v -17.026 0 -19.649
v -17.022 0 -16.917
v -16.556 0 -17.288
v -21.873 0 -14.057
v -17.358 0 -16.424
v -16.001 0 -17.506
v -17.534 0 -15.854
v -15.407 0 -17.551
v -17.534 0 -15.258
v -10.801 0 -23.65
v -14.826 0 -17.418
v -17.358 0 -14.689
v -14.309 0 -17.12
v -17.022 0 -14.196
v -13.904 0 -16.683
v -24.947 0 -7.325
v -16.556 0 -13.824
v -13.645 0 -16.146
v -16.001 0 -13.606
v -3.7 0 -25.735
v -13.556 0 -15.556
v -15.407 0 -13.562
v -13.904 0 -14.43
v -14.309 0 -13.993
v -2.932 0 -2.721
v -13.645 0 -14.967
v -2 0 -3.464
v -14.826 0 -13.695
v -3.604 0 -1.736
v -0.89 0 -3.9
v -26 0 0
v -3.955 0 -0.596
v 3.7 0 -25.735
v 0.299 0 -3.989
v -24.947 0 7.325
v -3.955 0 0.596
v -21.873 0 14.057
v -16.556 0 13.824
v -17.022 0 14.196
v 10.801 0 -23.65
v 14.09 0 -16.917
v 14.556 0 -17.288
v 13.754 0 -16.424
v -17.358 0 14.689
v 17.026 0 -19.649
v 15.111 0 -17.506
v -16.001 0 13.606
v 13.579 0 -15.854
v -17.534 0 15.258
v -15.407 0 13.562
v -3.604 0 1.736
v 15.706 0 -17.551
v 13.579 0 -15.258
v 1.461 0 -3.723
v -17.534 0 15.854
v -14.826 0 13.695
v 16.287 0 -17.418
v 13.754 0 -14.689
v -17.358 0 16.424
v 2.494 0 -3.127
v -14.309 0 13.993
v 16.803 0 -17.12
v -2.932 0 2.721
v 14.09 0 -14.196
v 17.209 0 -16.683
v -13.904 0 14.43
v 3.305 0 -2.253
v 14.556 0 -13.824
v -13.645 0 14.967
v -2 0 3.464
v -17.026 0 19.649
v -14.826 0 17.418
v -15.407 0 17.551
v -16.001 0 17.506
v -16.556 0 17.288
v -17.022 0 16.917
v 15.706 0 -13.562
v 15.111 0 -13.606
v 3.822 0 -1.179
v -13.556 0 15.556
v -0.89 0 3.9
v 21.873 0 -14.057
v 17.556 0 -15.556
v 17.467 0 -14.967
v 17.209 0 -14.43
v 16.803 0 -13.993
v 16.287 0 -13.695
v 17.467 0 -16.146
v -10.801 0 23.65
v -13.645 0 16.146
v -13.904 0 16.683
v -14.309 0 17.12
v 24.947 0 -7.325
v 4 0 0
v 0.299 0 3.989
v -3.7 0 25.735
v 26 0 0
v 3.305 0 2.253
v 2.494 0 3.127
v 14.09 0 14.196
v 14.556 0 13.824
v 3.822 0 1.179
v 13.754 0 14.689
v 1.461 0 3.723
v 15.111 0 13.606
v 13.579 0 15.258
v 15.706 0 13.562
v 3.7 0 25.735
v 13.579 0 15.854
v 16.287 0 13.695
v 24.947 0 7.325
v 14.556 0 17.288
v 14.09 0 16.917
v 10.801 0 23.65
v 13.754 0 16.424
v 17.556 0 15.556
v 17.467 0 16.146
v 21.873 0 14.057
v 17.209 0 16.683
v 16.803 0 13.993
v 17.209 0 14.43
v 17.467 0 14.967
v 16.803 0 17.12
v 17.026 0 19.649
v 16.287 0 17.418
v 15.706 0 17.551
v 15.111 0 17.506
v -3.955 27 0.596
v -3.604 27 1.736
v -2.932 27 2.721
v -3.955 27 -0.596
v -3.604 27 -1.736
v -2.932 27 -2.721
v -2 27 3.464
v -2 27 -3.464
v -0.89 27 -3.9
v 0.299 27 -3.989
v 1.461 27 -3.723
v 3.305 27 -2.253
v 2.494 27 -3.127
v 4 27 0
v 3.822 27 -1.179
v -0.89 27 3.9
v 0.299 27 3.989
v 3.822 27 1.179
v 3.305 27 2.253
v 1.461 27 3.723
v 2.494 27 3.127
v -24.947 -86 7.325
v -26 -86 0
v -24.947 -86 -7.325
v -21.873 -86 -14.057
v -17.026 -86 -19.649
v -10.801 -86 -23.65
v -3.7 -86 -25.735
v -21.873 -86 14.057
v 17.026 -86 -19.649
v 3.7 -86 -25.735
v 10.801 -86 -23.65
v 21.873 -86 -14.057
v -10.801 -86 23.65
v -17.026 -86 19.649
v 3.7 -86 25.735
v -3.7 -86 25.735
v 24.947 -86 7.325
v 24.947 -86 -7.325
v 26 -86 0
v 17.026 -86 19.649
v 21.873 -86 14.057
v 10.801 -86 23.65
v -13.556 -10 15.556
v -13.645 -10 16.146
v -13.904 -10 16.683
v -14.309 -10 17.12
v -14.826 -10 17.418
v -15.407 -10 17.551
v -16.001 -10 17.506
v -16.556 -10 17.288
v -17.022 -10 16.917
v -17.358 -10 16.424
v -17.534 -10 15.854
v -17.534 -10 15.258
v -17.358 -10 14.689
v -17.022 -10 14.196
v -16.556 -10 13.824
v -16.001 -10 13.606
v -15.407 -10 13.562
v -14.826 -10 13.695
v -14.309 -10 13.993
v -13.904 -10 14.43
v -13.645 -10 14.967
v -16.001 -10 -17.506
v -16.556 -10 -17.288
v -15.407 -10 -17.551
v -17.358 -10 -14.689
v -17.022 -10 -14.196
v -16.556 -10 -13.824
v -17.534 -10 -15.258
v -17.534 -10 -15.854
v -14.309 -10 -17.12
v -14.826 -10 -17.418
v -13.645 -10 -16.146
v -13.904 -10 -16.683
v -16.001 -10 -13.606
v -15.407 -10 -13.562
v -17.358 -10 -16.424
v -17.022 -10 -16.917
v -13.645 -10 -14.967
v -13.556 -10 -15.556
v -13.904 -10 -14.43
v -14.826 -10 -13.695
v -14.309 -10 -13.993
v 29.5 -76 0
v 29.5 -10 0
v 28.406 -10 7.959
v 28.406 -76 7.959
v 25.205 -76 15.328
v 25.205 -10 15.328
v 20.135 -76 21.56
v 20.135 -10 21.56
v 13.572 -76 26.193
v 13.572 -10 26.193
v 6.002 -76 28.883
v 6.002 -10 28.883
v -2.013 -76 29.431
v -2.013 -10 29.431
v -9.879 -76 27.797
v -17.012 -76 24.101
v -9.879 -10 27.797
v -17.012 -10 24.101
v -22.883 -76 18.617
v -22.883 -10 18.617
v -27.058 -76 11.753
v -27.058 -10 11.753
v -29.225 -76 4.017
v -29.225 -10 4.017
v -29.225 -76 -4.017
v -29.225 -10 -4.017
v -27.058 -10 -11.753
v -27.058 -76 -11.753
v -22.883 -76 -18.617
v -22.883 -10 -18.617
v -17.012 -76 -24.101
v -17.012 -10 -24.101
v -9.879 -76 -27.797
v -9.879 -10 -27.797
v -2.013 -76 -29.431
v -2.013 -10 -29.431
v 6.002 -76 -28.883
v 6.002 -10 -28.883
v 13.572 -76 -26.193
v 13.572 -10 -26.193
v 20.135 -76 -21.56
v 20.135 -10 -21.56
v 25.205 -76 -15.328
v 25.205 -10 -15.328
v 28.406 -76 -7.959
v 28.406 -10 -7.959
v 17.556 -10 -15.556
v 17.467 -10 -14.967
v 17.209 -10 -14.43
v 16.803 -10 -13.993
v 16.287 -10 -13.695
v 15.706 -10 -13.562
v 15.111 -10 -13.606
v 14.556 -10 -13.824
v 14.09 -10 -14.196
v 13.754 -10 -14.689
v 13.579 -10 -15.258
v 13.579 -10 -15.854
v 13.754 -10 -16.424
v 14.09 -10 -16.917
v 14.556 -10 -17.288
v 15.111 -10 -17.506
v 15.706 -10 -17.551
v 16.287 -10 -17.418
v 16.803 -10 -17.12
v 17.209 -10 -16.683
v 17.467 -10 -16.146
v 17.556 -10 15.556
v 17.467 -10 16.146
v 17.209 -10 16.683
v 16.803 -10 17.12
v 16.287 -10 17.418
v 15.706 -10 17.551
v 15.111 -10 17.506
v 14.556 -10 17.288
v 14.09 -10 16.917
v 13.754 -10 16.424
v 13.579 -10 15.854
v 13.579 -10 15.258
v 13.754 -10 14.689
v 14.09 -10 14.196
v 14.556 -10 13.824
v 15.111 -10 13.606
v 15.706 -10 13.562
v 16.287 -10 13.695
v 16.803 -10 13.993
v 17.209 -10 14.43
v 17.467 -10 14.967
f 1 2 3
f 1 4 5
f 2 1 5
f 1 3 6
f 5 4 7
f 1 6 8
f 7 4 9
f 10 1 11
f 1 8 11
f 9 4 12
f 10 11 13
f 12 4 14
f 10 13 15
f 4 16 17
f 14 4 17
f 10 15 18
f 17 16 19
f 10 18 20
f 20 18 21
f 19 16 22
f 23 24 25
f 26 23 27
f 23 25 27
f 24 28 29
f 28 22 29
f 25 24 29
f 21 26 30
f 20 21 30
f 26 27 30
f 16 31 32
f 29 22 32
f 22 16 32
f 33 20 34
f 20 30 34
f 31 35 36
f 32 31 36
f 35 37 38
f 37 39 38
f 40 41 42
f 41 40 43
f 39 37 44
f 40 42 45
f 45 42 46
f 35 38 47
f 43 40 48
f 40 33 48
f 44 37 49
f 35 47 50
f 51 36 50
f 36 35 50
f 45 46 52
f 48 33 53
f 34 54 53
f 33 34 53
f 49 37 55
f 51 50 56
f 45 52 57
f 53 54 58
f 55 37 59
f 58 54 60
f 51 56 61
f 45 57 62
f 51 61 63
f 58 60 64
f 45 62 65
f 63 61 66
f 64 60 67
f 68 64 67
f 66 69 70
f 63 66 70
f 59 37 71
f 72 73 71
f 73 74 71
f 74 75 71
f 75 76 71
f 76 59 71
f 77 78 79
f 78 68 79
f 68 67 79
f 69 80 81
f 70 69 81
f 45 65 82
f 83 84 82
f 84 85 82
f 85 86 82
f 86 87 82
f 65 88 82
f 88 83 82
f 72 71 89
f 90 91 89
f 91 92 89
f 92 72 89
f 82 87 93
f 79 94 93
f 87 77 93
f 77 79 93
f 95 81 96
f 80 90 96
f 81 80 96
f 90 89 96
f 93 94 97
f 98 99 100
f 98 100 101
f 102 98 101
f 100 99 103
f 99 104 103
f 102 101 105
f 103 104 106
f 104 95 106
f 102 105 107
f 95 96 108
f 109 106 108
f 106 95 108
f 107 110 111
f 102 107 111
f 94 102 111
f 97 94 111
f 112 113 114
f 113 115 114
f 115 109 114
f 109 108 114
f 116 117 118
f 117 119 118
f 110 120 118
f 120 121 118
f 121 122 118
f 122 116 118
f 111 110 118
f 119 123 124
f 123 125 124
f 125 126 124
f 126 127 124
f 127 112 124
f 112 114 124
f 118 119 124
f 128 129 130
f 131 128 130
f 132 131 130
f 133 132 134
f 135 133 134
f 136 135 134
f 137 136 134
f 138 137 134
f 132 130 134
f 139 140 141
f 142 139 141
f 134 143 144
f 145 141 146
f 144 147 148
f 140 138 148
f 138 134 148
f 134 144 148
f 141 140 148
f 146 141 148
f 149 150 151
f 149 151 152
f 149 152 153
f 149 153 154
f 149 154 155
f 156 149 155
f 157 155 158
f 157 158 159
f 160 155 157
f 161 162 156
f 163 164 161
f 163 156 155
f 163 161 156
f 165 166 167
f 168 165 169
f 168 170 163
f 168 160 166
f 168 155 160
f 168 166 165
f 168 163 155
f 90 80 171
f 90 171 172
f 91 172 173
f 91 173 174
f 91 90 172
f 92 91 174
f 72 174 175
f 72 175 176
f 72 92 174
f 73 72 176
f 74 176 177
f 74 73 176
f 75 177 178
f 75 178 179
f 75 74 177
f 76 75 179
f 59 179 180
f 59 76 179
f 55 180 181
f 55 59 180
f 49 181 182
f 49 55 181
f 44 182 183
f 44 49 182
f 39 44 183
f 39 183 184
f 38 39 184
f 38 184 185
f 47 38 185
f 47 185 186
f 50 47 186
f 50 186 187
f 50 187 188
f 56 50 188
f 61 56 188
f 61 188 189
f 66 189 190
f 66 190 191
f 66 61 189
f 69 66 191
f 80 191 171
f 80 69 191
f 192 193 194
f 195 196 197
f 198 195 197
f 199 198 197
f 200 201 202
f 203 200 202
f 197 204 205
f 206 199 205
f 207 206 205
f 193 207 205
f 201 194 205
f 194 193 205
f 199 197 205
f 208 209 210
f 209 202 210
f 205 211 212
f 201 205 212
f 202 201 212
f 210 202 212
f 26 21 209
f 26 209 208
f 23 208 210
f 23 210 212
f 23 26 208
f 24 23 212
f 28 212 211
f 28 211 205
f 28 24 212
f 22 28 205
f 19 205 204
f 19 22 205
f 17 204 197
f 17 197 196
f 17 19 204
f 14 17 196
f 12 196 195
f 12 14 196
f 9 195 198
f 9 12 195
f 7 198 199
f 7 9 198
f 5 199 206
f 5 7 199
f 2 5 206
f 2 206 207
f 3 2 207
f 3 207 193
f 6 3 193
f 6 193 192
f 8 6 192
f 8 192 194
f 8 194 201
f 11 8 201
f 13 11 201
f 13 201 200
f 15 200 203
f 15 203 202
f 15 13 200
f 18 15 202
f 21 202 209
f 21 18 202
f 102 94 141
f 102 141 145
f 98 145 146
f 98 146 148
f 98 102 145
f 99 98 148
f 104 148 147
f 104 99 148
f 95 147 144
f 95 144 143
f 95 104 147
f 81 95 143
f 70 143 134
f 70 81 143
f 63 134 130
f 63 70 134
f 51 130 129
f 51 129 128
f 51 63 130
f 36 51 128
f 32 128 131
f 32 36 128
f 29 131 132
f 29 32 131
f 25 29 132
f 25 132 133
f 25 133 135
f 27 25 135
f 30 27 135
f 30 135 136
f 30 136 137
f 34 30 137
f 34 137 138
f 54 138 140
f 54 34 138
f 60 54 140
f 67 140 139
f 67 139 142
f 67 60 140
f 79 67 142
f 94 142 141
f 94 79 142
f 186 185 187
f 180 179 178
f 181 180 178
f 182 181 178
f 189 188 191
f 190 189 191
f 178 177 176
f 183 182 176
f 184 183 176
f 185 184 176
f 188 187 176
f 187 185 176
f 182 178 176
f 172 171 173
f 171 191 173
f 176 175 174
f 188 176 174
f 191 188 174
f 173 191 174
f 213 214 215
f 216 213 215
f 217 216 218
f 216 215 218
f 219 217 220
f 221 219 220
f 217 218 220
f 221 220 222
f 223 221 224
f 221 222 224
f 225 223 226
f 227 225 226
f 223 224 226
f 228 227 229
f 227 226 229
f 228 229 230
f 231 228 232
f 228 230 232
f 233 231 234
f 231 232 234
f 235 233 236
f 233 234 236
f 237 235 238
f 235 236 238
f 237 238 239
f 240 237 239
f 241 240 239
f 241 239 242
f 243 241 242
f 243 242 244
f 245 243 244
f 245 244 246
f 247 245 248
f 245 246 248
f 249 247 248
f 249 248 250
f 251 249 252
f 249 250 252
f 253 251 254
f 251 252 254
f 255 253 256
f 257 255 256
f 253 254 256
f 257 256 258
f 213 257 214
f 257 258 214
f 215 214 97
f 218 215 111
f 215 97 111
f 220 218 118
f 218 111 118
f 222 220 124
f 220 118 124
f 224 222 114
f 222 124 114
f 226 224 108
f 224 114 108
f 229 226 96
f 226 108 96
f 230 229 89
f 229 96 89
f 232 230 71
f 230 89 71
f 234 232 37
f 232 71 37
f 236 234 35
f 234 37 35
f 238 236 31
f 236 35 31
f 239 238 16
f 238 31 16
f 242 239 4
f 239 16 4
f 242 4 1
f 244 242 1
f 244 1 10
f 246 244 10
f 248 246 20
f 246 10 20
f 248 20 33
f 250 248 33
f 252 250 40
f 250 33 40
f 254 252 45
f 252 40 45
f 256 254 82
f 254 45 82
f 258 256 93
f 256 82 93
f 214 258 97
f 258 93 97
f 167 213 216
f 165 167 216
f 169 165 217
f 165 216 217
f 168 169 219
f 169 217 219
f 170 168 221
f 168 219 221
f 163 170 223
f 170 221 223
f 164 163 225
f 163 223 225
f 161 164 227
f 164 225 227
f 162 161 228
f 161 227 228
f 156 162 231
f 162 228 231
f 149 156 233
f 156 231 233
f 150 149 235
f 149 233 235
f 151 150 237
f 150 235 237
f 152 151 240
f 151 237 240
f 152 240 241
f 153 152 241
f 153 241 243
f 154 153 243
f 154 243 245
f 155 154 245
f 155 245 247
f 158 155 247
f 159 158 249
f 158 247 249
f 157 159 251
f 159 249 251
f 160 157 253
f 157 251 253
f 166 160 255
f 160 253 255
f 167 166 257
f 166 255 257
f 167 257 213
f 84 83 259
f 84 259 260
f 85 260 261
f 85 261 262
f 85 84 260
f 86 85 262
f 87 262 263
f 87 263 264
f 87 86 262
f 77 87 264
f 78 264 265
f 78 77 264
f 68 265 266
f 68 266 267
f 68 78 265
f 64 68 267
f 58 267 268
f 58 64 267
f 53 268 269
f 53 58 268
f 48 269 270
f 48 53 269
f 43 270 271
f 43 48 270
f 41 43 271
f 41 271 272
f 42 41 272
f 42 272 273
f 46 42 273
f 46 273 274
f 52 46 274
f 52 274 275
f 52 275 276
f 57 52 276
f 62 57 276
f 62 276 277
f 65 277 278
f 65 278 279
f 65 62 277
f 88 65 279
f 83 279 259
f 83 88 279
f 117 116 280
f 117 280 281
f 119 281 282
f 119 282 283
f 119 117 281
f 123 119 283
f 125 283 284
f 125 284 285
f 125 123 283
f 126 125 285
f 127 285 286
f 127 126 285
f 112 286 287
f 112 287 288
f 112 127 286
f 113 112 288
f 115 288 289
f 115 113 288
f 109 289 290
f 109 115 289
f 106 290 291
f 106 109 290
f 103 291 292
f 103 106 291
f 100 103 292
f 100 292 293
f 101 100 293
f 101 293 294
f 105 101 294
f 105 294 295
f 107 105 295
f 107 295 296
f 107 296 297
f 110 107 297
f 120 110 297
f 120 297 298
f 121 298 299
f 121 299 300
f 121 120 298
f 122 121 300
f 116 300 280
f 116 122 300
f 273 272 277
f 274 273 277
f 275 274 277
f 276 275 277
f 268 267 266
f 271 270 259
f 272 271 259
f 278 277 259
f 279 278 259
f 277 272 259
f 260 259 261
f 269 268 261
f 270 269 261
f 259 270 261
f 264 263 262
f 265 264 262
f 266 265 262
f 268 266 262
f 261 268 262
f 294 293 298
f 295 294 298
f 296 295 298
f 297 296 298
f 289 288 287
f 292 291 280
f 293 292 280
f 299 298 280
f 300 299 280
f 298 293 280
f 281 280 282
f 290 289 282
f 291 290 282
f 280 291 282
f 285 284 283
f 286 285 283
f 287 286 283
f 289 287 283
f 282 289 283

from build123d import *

# Parameters (mm, degrees)
F0_R     = 29.5
F0_R_2   = 2
F0_R_3   = 4
F1_DEPTH = 86
F2_DEPTH = 27
F3_DEPTH = 10
F4_SIZE2 = 3.5
F4_SIZE  = 10
F5_SIZE2 = 10
F5_SIZE  = 3.5


with BuildPart() as f1:
    # F0 (on Front) → F1 (new body)
    with BuildSketch(Plane.XZ):
        Circle(F0_R)
        with Locations((-15.5563491861, -15.5563491861)):
            Circle(F0_R_2, mode=Mode.SUBTRACT)
        with Locations((15.5563491861, -15.5563491861)):
            Circle(F0_R_2, mode=Mode.SUBTRACT)
        with Locations((-15.5563491861, 15.5563491861)):
            Circle(F0_R_2, mode=Mode.SUBTRACT)
        Circle(F0_R_3, mode=Mode.SUBTRACT)
        with Locations((15.5563491861, 15.5563491861)):
            Circle(F0_R_2, mode=Mode.SUBTRACT)
        Circle(F0_R_3)
        with Locations((15.5563491861, 15.5563491861)):
            Circle(F0_R_2)
        with Locations((-15.5563491861, 15.5563491861)):
            Circle(F0_R_2)
        with Locations((-15.5563491861, -15.5563491861)):
            Circle(F0_R_2)
        with Locations((15.5563491861, -15.5563491861)):
            Circle(F0_R_2)
    extrude(amount=F1_DEPTH)

    # F0 (on Front) → F2 (join)
    with BuildSketch(Plane.XZ):
        Circle(F0_R_3)
    extrude(amount=-F2_DEPTH)

    # F0 (on Front) → F3 (cut)
    with BuildSketch(Plane.XZ):
        with Locations((15.5563491861, 15.5563491861)):
            Circle(F0_R_2)
        with Locations((-15.5563491861, 15.5563491861)):
            Circle(F0_R_2)
        with Locations((15.5563491861, -15.5563491861)):
            Circle(F0_R_2)
        with Locations((-15.5563491861, -15.5563491861)):
            Circle(F0_R_2)
    extrude(amount=F3_DEPTH, mode=Mode.SUBTRACT)

    # F4
    f4_edges = [f1.edges().sort_by_distance(p)[0] for p in [
        (-29.5, 0, 0),
    ]]
    f4_side = f1.faces().sort_by_distance((-29.5, -43, 0))[0]
    chamfer(f4_edges, length=F4_SIZE, length2=F4_SIZE2, reference=f4_side)

    # F5
    f5_edges = [f1.edges().sort_by_distance(p)[0] for p in [
        (-29.5, -86, 0),
    ]]
    f5_side = f1.faces().sort_by_distance((0, -86, 0))[0]
    chamfer(f5_edges, length=F5_SIZE, length2=F5_SIZE2, reference=f5_side)


solid = f1.part
